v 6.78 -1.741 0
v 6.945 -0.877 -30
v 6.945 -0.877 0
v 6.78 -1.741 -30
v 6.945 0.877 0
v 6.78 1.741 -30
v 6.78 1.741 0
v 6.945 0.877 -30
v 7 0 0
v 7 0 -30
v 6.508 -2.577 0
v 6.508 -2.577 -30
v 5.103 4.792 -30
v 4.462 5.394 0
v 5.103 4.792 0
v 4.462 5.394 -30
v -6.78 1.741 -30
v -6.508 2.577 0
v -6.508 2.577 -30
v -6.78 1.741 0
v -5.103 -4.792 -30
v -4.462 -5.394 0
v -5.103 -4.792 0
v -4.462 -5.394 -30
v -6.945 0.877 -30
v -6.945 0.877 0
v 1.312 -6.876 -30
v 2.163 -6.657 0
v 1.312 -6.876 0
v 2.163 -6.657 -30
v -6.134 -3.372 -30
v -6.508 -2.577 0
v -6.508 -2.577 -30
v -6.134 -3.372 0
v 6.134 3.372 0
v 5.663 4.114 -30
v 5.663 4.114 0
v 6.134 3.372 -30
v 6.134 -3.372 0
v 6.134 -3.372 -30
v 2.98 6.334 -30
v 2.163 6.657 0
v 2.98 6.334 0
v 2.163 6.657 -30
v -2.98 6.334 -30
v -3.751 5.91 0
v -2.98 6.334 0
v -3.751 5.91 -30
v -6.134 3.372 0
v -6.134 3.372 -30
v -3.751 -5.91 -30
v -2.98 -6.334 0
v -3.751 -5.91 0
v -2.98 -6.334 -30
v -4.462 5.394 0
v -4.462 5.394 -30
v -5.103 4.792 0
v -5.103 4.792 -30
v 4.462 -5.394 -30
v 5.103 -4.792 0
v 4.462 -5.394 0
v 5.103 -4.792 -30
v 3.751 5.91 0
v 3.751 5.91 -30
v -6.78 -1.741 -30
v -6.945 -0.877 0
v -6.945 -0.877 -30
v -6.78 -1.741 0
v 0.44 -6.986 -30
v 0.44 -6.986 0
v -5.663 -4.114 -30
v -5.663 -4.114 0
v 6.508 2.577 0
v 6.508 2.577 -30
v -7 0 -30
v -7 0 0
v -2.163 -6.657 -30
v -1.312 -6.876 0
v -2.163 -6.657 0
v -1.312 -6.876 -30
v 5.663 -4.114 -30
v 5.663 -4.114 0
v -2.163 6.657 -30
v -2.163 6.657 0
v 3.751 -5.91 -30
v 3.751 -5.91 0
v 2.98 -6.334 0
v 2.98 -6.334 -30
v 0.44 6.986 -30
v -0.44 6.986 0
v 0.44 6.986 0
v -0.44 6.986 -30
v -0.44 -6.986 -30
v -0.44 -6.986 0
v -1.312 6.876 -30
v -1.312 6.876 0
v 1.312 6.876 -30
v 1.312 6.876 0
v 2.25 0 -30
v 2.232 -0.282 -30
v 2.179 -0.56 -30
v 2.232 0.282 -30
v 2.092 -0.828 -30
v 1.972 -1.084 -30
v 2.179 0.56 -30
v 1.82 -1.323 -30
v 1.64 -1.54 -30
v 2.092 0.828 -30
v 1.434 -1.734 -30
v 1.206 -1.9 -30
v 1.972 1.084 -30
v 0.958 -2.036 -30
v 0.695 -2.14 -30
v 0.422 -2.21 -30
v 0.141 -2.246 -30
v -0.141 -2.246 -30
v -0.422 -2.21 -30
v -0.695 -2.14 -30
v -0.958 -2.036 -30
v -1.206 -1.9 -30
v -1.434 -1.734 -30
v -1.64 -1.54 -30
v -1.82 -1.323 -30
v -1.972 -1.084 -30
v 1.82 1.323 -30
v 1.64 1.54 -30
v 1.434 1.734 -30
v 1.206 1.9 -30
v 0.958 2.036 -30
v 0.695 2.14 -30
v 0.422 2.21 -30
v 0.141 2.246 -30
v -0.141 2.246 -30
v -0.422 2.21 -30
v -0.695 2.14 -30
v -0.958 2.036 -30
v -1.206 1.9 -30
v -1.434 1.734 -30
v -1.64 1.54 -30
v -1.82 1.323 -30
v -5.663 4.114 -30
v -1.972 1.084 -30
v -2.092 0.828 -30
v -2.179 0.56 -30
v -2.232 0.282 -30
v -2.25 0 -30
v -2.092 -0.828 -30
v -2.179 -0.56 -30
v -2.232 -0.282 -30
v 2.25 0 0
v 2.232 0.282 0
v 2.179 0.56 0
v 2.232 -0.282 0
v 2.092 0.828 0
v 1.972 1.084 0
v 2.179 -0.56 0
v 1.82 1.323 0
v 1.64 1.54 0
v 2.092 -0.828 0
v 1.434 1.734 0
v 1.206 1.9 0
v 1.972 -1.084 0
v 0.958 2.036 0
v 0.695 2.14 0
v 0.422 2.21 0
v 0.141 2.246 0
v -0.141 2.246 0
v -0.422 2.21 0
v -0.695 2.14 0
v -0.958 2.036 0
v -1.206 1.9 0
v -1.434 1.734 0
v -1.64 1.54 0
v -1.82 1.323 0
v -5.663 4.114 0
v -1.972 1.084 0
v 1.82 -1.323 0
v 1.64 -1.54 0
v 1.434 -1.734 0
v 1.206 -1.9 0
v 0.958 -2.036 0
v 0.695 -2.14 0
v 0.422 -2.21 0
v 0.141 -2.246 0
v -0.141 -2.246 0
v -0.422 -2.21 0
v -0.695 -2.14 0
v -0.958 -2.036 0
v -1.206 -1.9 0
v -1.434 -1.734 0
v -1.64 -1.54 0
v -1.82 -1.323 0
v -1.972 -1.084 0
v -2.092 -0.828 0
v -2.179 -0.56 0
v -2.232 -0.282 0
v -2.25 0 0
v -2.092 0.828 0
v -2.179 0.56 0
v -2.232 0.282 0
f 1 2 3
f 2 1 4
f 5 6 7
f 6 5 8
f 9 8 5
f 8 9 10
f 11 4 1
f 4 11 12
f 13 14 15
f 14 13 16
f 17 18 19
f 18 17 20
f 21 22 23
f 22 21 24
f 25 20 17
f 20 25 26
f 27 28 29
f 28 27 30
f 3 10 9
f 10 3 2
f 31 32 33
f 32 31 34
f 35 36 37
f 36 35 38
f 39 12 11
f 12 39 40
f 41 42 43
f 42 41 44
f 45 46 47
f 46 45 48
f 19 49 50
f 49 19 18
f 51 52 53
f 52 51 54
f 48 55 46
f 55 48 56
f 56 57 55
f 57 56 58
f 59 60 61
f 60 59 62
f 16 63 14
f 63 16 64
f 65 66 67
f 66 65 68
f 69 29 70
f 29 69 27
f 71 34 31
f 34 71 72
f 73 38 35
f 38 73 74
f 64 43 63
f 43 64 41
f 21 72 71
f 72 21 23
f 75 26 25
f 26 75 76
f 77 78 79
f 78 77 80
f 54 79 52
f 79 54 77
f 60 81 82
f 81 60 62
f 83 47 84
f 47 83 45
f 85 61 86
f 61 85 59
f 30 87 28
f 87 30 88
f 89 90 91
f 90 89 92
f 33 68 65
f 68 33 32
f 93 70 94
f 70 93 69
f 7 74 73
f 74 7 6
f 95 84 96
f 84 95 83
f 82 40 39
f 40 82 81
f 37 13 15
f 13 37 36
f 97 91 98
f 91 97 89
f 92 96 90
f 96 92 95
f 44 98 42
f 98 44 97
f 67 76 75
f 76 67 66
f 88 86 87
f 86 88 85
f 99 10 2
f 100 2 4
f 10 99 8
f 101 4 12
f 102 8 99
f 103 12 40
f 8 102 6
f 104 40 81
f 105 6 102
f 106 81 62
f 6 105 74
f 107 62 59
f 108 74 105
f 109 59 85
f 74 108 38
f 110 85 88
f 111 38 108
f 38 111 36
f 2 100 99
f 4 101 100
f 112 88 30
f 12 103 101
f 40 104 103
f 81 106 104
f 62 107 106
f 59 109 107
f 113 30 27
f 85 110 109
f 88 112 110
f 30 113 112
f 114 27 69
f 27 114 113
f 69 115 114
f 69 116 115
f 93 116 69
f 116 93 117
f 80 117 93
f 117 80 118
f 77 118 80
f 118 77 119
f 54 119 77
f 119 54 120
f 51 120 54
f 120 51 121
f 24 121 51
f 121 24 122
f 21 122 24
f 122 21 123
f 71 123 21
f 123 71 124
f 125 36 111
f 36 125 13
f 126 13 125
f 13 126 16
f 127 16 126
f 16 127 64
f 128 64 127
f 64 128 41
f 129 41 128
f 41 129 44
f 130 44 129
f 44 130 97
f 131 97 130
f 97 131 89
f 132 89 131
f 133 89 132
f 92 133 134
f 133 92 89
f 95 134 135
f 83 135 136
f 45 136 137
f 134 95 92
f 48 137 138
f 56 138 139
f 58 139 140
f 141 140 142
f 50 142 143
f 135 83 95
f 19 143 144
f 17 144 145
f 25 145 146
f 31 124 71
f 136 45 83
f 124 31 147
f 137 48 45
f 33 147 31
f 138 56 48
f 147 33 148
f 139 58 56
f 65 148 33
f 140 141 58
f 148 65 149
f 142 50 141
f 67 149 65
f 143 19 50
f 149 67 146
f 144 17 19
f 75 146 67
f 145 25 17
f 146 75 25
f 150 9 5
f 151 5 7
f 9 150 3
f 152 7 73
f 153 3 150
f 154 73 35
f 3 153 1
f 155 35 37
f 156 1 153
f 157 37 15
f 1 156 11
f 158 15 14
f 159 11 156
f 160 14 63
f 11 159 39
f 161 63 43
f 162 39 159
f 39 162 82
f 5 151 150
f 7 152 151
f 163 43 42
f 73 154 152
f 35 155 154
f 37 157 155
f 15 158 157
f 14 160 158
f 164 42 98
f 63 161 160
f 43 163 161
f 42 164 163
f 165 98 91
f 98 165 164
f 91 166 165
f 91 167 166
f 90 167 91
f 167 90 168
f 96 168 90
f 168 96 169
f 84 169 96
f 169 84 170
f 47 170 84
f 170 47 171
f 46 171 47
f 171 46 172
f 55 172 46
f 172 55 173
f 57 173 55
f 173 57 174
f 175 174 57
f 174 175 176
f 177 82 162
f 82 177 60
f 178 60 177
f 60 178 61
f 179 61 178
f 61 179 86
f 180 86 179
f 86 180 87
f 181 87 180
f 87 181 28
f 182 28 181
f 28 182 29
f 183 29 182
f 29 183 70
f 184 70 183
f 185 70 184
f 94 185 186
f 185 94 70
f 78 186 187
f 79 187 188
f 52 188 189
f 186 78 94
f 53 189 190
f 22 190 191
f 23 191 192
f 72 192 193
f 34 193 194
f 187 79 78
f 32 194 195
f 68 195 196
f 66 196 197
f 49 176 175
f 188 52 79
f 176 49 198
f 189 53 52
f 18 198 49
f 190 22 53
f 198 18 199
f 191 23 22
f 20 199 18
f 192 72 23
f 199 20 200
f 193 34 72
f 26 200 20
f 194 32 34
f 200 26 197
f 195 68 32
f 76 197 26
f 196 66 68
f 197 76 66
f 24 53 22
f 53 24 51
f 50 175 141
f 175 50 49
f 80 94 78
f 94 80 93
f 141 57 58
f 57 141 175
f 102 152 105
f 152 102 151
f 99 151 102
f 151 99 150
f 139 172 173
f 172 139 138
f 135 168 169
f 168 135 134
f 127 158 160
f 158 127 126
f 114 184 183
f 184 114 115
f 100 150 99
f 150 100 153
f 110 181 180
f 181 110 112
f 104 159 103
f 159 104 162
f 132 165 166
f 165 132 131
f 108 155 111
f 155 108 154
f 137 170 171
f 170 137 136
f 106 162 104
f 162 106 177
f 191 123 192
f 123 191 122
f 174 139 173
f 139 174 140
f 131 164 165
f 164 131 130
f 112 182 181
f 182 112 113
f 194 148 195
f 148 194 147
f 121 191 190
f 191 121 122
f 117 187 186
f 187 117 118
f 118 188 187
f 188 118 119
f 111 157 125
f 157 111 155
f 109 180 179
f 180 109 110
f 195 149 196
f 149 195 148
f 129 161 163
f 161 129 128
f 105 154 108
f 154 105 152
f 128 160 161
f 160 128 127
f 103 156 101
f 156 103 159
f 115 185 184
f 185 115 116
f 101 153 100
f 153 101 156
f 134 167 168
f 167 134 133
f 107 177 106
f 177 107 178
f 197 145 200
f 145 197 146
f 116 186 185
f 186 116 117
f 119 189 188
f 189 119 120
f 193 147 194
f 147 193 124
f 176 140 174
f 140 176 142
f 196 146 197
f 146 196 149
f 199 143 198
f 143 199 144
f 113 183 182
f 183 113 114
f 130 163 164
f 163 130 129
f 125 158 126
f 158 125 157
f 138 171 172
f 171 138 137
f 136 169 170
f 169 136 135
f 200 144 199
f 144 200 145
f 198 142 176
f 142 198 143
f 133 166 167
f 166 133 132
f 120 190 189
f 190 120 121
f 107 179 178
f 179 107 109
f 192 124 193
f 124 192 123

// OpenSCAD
$fn = 50;


difference() {
	union() {
		translate(v = [0, 0, -30.0000000000]) {
			cylinder(h = 30, r = 7.0000000000);
		}
		cylinder(h = 0, r = 13.0000000000);
	}
	union() {
		#translate(v = [0, 0, -30]) {
			cylinder(h = 30, r = 2.2500000000);
		}
	}
}
